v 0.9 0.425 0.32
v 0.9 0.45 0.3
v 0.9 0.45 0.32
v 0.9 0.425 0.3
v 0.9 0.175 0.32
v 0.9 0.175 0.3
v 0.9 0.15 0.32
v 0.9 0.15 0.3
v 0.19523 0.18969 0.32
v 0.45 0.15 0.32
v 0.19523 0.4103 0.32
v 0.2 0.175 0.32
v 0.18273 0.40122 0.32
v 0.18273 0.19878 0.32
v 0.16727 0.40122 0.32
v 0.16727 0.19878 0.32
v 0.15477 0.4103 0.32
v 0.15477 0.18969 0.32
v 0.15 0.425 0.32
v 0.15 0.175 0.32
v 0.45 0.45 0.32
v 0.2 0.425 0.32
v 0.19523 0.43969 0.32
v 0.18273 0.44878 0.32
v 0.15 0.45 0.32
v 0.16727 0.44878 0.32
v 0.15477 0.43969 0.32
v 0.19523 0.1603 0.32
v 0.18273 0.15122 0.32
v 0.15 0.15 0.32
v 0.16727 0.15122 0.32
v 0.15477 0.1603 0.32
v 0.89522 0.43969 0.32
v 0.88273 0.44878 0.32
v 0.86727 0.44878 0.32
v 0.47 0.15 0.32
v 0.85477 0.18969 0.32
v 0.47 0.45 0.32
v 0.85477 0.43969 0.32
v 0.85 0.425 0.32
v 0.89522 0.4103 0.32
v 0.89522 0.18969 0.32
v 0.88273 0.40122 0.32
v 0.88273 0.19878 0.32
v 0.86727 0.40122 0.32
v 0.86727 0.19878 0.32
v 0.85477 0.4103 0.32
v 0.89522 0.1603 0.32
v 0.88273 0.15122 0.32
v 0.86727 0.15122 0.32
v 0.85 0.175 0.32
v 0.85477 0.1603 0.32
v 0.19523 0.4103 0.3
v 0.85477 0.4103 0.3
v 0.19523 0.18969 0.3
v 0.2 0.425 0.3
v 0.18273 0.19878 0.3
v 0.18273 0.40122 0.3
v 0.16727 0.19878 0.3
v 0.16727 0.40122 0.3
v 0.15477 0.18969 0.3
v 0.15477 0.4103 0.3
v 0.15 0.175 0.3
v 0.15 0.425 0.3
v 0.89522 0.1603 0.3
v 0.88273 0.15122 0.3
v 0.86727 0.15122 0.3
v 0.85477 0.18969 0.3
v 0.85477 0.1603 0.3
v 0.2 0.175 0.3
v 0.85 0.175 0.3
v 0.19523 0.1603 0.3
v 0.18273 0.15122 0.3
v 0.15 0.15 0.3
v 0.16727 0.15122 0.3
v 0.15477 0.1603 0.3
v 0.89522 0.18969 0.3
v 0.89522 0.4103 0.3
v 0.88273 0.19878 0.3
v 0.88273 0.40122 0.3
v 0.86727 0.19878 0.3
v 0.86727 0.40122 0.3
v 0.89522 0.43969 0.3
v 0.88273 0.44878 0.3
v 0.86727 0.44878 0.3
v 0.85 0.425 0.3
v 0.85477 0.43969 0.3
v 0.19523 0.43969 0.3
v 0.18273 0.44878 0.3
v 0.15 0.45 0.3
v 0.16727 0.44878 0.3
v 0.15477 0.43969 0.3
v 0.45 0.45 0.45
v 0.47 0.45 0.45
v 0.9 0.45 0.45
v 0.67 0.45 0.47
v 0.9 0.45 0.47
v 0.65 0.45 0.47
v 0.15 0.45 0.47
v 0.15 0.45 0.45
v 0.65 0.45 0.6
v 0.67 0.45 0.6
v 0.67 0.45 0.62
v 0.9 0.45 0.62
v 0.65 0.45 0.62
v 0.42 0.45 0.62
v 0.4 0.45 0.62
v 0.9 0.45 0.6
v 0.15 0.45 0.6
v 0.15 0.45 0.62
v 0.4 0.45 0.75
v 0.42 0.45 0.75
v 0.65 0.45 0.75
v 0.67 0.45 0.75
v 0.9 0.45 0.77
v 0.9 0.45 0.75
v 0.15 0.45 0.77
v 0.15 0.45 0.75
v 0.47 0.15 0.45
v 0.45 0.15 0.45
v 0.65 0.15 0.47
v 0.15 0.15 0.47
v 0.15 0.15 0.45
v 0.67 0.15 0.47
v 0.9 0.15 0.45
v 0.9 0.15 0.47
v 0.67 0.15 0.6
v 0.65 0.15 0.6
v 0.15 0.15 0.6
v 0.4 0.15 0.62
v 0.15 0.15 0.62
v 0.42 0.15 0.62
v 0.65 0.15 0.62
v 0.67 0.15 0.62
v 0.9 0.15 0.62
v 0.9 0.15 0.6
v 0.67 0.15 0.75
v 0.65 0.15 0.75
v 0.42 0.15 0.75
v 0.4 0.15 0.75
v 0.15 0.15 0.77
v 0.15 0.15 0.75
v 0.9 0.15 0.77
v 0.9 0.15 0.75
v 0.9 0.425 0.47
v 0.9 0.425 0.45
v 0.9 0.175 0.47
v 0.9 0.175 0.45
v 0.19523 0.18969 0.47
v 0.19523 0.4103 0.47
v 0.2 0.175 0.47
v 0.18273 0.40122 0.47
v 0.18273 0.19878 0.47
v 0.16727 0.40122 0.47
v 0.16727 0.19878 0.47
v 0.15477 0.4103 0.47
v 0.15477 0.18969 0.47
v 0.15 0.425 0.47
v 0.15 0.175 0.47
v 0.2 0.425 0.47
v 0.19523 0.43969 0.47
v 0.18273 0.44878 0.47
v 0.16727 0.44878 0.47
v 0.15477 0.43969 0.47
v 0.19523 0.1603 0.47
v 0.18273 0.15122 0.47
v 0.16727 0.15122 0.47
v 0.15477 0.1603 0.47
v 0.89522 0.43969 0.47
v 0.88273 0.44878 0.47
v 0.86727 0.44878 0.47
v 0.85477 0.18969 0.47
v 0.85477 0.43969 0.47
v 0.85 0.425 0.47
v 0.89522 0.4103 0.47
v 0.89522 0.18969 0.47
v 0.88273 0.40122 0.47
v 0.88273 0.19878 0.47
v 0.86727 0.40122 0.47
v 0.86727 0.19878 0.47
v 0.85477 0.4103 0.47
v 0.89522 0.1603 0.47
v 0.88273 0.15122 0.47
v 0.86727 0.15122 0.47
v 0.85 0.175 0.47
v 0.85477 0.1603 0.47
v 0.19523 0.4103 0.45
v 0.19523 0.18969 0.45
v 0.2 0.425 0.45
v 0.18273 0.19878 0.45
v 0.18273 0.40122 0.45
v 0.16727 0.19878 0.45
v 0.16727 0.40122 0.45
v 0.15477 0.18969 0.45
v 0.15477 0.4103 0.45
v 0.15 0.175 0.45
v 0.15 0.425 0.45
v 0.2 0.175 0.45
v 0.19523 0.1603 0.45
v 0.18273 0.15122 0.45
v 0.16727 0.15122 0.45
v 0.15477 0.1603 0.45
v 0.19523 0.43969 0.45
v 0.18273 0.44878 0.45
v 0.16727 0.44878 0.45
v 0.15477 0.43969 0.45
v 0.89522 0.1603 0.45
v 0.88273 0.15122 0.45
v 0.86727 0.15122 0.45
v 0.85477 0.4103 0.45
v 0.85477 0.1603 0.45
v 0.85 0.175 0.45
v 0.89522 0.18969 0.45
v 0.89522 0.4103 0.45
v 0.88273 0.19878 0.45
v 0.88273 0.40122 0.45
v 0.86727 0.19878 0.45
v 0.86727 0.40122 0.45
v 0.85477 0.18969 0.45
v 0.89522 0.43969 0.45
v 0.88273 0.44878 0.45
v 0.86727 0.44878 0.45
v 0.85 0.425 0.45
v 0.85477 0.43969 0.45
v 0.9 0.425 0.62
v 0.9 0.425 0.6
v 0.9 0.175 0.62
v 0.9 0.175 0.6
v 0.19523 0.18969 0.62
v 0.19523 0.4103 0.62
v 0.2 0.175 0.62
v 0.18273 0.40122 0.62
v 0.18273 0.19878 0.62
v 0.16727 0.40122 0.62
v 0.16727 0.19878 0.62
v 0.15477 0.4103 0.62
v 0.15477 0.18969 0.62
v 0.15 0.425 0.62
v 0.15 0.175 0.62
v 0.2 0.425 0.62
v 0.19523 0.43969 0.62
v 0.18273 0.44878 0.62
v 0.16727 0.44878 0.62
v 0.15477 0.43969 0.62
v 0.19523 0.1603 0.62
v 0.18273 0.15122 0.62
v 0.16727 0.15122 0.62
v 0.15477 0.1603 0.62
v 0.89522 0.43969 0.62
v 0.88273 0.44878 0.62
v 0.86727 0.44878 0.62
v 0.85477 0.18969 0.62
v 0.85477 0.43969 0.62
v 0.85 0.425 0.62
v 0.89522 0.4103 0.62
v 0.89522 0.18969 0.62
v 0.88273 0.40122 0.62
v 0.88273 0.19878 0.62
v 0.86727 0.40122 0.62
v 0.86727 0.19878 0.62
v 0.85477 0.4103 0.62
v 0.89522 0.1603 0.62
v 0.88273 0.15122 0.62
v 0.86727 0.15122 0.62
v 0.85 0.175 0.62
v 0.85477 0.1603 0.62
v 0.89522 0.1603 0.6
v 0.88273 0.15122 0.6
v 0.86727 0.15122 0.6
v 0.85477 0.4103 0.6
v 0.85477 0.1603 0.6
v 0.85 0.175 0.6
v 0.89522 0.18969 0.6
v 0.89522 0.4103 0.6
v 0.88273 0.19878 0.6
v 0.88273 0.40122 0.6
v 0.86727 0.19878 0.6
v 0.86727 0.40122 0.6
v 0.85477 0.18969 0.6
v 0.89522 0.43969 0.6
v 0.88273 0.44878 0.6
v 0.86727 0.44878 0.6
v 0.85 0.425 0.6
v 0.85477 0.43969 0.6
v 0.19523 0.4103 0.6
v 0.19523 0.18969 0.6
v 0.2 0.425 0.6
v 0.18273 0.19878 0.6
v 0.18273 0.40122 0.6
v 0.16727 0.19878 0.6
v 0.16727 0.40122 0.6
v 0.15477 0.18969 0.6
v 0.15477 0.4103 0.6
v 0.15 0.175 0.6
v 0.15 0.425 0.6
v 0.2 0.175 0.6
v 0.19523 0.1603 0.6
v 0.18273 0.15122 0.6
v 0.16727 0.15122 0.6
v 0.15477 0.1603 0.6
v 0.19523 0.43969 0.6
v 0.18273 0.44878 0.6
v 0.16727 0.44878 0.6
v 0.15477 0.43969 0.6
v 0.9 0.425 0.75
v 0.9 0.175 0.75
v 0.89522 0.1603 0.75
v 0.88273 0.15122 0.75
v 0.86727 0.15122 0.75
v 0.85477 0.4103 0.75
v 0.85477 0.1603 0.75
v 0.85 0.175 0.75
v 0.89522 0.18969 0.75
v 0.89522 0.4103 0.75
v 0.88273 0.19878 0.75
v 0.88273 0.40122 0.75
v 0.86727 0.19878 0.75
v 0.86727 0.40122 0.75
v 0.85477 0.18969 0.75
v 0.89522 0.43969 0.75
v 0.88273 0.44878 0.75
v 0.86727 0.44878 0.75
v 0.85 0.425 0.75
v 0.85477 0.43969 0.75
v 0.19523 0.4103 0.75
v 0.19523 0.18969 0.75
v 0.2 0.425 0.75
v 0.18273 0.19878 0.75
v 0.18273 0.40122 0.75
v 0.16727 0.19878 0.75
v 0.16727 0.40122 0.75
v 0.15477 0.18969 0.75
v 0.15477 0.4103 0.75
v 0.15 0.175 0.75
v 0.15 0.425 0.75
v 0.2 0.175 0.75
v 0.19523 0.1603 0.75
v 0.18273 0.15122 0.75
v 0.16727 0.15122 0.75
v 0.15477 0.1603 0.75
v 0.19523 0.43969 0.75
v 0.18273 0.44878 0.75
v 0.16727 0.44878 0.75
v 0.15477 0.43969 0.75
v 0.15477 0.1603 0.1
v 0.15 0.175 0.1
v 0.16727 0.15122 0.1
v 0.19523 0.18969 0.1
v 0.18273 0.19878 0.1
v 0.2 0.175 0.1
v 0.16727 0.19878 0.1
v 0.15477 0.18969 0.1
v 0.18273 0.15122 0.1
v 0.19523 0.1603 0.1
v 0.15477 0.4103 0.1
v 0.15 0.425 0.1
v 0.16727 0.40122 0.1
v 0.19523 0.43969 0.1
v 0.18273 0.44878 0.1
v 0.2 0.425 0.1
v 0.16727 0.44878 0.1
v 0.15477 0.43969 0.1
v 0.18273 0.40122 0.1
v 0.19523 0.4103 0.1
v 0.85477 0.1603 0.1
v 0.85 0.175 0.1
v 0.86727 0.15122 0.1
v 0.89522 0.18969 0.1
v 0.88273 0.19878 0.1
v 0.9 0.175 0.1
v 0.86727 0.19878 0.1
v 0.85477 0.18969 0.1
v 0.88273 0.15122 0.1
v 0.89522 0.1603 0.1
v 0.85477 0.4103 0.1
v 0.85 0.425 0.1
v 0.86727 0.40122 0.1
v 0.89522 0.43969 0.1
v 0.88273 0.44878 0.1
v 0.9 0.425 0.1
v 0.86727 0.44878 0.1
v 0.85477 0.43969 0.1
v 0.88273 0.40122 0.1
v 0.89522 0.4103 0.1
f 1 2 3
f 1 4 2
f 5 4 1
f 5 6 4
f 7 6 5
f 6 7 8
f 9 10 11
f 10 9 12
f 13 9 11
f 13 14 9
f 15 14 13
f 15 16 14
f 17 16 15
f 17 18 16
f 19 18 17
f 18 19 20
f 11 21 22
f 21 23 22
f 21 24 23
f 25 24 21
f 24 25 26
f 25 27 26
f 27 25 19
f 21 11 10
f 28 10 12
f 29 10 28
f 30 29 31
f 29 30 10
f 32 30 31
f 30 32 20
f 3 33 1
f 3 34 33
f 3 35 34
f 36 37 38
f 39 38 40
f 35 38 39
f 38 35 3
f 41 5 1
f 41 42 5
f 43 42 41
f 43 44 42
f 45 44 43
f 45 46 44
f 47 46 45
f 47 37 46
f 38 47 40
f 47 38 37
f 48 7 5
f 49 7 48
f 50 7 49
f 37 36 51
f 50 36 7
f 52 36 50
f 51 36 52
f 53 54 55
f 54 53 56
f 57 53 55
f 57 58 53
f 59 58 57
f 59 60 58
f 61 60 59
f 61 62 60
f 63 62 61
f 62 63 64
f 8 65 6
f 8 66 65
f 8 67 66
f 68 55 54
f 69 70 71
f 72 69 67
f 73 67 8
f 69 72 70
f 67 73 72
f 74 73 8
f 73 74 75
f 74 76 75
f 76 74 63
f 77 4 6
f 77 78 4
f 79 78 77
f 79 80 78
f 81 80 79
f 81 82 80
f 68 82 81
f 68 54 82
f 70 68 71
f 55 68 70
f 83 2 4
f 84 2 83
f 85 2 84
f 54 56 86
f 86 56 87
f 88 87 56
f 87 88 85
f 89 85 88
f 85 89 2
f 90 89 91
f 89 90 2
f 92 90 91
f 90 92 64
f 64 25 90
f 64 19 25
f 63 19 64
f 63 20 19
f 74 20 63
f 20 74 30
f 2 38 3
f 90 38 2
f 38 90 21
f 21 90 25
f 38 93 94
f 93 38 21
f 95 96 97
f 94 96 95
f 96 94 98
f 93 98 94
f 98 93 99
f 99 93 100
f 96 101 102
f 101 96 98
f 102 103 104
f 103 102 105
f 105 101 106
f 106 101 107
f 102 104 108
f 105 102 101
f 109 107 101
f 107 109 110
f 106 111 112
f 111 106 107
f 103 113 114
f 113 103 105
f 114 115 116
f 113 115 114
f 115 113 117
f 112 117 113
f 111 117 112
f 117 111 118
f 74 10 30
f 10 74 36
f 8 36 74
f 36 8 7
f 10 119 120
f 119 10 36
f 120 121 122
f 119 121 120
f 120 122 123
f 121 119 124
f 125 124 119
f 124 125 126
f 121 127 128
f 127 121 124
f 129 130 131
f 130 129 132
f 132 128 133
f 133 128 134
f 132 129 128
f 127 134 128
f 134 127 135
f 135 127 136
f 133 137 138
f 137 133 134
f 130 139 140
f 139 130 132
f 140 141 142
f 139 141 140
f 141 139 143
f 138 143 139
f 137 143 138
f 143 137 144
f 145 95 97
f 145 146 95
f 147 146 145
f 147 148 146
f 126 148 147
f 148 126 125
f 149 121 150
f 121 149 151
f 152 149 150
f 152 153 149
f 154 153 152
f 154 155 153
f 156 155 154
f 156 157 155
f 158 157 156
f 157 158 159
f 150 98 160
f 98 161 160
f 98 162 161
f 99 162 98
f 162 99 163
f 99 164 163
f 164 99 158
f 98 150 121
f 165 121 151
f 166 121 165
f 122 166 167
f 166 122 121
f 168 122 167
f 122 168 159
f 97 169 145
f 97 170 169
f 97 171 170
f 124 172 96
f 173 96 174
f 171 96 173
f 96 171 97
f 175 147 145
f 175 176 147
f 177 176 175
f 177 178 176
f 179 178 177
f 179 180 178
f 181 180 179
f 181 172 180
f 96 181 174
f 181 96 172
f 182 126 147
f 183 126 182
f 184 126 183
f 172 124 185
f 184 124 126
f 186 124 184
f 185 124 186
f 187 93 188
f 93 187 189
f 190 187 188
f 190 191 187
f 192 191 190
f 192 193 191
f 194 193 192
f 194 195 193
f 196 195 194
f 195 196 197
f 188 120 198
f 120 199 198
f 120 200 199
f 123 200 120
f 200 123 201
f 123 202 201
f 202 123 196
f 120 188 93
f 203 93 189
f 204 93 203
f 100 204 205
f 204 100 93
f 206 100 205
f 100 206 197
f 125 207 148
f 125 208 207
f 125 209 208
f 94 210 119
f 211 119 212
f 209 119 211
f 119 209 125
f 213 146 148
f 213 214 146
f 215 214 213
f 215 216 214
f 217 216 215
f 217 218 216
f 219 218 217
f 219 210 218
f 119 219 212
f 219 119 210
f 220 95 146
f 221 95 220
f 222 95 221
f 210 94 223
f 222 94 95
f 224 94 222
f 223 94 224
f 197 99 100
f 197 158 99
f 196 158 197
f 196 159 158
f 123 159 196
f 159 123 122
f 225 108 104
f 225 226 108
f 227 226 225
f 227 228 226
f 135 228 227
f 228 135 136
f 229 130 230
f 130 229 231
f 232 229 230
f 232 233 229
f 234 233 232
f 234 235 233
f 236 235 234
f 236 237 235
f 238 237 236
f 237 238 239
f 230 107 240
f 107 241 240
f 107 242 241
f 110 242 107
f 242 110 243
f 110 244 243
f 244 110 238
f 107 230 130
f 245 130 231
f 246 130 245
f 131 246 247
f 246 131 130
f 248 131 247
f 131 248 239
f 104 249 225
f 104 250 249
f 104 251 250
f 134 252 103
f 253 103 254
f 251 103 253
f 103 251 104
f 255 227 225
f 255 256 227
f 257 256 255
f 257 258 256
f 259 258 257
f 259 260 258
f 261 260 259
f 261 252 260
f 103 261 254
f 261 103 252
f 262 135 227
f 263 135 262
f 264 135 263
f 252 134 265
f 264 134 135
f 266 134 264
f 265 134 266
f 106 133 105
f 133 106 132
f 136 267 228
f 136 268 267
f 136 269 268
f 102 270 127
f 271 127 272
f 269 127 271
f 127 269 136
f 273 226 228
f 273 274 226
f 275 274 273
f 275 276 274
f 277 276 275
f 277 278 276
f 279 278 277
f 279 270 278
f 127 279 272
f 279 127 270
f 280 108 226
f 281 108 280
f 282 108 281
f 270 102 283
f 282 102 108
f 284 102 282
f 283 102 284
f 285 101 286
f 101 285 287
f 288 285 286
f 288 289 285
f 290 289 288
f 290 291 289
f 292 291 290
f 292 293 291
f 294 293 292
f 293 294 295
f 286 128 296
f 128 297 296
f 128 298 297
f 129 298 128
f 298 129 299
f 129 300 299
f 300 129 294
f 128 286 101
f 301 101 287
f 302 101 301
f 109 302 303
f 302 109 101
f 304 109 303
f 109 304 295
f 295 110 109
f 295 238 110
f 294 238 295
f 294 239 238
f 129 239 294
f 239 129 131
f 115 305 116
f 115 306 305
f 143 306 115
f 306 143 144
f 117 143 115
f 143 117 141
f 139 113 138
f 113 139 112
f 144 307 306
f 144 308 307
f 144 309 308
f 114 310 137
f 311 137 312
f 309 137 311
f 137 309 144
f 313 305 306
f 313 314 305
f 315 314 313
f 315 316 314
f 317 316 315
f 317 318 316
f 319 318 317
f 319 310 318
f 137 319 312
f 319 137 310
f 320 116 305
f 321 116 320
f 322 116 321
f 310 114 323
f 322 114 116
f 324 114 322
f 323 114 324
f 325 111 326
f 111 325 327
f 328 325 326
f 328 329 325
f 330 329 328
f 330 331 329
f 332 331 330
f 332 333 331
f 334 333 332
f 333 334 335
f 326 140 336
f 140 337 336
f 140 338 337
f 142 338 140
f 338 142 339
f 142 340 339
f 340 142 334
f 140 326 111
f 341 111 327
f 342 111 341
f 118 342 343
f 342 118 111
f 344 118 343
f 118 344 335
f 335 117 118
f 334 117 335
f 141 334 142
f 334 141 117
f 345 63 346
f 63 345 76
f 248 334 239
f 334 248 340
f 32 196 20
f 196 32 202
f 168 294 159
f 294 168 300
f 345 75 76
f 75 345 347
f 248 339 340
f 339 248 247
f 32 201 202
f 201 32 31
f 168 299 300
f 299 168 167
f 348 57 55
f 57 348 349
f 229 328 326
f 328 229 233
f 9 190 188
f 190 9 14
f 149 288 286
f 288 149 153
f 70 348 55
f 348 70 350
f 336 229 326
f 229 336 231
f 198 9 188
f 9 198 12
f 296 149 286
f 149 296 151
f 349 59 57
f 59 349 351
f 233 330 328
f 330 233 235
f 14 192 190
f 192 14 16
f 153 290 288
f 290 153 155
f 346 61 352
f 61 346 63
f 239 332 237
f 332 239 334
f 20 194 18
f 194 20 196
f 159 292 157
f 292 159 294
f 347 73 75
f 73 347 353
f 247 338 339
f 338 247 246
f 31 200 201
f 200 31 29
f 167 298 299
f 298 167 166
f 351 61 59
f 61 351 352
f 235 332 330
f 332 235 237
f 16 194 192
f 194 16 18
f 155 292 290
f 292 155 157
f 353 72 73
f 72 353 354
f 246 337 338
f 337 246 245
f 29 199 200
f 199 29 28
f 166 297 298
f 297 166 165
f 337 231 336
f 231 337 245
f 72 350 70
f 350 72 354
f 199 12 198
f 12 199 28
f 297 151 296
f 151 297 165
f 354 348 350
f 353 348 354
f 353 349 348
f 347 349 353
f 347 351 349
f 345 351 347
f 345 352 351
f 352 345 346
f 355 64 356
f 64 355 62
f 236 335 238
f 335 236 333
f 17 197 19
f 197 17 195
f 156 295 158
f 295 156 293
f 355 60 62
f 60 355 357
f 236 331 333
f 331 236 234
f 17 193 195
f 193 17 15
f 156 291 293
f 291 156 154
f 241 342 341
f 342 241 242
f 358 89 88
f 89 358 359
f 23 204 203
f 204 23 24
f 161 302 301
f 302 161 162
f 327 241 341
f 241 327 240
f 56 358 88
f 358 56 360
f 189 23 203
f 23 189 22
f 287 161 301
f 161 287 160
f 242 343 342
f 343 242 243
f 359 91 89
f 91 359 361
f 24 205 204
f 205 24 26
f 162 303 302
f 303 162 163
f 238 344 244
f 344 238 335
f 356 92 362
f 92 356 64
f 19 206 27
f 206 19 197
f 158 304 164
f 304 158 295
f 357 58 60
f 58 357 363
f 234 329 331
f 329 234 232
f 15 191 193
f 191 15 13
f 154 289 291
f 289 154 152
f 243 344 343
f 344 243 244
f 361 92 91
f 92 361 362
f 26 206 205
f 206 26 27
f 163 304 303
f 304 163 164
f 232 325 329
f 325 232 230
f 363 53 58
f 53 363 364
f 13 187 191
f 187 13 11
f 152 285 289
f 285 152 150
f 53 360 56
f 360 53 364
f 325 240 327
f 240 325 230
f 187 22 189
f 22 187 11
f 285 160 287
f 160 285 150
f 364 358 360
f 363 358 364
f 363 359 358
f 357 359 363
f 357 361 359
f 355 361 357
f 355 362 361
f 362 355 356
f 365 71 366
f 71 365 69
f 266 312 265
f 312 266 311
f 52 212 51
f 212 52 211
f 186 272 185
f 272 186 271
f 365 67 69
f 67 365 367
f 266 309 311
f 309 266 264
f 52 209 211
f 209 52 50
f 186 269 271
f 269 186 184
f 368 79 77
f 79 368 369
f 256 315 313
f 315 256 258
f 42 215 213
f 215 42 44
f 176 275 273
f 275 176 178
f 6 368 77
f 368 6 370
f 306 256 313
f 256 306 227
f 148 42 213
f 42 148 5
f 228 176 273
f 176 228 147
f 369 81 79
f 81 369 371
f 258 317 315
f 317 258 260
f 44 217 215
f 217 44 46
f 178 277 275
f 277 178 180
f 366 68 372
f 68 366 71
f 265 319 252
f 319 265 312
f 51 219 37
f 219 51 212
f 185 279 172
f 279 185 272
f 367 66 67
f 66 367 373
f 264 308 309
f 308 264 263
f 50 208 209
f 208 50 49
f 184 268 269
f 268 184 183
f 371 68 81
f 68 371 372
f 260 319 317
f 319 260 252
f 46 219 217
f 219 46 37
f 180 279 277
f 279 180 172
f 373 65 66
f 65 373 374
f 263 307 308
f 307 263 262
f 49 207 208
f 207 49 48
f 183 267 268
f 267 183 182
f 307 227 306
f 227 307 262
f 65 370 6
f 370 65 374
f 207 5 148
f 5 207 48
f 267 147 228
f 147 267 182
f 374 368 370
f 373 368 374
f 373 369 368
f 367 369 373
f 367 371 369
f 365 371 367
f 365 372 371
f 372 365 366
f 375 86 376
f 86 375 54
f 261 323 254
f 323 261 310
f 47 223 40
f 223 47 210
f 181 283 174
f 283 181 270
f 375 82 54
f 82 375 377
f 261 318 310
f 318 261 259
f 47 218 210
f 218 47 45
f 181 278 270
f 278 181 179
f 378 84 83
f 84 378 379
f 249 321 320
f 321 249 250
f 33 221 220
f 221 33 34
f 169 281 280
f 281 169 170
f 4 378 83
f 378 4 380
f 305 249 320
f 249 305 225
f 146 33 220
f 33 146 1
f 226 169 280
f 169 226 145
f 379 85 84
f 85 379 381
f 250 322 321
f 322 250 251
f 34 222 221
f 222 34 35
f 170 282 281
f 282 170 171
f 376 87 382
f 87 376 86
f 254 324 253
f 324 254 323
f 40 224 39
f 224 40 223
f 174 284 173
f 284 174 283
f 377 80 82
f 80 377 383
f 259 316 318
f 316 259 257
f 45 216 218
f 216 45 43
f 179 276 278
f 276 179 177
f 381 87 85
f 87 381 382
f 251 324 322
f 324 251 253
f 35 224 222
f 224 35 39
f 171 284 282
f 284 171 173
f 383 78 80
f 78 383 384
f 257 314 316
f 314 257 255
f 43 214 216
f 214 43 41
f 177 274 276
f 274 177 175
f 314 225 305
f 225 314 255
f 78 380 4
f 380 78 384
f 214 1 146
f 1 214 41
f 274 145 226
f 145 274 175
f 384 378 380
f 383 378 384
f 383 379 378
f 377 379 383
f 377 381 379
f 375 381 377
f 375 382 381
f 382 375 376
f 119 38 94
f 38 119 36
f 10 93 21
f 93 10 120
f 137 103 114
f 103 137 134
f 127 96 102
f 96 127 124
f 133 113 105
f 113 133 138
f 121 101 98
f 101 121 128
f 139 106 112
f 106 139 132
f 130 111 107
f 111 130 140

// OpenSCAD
color([0.6, 0.4, 0.2])
translate([0.15, 0.15, 0.1]) {
    // Shelf 
    for(z=[0.2 : .15 : .75]) {
        translate([0,0,z])
        cube([.75, 0.3, 0.02]);
    }
    // Legs
    for(x=[0.025, 0.725])
    for(y=[0.025, 0.275])
    translate([x, y, 0])
    cylinder(0.65, r=0.025, $fn=10);
    
    translate([0.3, 0, 0.2])
    cube([.02, 0.3, .15]);
    
    translate([0.5, 0, 0.35])
    cube([.02, 0.3, .15]);


    translate([0.25, 0, 0.5])
    cube([.02, 0.3, .15]);
    translate([0.5, 0, 0.5])
    cube([.02, 0.3, .15]);

}
